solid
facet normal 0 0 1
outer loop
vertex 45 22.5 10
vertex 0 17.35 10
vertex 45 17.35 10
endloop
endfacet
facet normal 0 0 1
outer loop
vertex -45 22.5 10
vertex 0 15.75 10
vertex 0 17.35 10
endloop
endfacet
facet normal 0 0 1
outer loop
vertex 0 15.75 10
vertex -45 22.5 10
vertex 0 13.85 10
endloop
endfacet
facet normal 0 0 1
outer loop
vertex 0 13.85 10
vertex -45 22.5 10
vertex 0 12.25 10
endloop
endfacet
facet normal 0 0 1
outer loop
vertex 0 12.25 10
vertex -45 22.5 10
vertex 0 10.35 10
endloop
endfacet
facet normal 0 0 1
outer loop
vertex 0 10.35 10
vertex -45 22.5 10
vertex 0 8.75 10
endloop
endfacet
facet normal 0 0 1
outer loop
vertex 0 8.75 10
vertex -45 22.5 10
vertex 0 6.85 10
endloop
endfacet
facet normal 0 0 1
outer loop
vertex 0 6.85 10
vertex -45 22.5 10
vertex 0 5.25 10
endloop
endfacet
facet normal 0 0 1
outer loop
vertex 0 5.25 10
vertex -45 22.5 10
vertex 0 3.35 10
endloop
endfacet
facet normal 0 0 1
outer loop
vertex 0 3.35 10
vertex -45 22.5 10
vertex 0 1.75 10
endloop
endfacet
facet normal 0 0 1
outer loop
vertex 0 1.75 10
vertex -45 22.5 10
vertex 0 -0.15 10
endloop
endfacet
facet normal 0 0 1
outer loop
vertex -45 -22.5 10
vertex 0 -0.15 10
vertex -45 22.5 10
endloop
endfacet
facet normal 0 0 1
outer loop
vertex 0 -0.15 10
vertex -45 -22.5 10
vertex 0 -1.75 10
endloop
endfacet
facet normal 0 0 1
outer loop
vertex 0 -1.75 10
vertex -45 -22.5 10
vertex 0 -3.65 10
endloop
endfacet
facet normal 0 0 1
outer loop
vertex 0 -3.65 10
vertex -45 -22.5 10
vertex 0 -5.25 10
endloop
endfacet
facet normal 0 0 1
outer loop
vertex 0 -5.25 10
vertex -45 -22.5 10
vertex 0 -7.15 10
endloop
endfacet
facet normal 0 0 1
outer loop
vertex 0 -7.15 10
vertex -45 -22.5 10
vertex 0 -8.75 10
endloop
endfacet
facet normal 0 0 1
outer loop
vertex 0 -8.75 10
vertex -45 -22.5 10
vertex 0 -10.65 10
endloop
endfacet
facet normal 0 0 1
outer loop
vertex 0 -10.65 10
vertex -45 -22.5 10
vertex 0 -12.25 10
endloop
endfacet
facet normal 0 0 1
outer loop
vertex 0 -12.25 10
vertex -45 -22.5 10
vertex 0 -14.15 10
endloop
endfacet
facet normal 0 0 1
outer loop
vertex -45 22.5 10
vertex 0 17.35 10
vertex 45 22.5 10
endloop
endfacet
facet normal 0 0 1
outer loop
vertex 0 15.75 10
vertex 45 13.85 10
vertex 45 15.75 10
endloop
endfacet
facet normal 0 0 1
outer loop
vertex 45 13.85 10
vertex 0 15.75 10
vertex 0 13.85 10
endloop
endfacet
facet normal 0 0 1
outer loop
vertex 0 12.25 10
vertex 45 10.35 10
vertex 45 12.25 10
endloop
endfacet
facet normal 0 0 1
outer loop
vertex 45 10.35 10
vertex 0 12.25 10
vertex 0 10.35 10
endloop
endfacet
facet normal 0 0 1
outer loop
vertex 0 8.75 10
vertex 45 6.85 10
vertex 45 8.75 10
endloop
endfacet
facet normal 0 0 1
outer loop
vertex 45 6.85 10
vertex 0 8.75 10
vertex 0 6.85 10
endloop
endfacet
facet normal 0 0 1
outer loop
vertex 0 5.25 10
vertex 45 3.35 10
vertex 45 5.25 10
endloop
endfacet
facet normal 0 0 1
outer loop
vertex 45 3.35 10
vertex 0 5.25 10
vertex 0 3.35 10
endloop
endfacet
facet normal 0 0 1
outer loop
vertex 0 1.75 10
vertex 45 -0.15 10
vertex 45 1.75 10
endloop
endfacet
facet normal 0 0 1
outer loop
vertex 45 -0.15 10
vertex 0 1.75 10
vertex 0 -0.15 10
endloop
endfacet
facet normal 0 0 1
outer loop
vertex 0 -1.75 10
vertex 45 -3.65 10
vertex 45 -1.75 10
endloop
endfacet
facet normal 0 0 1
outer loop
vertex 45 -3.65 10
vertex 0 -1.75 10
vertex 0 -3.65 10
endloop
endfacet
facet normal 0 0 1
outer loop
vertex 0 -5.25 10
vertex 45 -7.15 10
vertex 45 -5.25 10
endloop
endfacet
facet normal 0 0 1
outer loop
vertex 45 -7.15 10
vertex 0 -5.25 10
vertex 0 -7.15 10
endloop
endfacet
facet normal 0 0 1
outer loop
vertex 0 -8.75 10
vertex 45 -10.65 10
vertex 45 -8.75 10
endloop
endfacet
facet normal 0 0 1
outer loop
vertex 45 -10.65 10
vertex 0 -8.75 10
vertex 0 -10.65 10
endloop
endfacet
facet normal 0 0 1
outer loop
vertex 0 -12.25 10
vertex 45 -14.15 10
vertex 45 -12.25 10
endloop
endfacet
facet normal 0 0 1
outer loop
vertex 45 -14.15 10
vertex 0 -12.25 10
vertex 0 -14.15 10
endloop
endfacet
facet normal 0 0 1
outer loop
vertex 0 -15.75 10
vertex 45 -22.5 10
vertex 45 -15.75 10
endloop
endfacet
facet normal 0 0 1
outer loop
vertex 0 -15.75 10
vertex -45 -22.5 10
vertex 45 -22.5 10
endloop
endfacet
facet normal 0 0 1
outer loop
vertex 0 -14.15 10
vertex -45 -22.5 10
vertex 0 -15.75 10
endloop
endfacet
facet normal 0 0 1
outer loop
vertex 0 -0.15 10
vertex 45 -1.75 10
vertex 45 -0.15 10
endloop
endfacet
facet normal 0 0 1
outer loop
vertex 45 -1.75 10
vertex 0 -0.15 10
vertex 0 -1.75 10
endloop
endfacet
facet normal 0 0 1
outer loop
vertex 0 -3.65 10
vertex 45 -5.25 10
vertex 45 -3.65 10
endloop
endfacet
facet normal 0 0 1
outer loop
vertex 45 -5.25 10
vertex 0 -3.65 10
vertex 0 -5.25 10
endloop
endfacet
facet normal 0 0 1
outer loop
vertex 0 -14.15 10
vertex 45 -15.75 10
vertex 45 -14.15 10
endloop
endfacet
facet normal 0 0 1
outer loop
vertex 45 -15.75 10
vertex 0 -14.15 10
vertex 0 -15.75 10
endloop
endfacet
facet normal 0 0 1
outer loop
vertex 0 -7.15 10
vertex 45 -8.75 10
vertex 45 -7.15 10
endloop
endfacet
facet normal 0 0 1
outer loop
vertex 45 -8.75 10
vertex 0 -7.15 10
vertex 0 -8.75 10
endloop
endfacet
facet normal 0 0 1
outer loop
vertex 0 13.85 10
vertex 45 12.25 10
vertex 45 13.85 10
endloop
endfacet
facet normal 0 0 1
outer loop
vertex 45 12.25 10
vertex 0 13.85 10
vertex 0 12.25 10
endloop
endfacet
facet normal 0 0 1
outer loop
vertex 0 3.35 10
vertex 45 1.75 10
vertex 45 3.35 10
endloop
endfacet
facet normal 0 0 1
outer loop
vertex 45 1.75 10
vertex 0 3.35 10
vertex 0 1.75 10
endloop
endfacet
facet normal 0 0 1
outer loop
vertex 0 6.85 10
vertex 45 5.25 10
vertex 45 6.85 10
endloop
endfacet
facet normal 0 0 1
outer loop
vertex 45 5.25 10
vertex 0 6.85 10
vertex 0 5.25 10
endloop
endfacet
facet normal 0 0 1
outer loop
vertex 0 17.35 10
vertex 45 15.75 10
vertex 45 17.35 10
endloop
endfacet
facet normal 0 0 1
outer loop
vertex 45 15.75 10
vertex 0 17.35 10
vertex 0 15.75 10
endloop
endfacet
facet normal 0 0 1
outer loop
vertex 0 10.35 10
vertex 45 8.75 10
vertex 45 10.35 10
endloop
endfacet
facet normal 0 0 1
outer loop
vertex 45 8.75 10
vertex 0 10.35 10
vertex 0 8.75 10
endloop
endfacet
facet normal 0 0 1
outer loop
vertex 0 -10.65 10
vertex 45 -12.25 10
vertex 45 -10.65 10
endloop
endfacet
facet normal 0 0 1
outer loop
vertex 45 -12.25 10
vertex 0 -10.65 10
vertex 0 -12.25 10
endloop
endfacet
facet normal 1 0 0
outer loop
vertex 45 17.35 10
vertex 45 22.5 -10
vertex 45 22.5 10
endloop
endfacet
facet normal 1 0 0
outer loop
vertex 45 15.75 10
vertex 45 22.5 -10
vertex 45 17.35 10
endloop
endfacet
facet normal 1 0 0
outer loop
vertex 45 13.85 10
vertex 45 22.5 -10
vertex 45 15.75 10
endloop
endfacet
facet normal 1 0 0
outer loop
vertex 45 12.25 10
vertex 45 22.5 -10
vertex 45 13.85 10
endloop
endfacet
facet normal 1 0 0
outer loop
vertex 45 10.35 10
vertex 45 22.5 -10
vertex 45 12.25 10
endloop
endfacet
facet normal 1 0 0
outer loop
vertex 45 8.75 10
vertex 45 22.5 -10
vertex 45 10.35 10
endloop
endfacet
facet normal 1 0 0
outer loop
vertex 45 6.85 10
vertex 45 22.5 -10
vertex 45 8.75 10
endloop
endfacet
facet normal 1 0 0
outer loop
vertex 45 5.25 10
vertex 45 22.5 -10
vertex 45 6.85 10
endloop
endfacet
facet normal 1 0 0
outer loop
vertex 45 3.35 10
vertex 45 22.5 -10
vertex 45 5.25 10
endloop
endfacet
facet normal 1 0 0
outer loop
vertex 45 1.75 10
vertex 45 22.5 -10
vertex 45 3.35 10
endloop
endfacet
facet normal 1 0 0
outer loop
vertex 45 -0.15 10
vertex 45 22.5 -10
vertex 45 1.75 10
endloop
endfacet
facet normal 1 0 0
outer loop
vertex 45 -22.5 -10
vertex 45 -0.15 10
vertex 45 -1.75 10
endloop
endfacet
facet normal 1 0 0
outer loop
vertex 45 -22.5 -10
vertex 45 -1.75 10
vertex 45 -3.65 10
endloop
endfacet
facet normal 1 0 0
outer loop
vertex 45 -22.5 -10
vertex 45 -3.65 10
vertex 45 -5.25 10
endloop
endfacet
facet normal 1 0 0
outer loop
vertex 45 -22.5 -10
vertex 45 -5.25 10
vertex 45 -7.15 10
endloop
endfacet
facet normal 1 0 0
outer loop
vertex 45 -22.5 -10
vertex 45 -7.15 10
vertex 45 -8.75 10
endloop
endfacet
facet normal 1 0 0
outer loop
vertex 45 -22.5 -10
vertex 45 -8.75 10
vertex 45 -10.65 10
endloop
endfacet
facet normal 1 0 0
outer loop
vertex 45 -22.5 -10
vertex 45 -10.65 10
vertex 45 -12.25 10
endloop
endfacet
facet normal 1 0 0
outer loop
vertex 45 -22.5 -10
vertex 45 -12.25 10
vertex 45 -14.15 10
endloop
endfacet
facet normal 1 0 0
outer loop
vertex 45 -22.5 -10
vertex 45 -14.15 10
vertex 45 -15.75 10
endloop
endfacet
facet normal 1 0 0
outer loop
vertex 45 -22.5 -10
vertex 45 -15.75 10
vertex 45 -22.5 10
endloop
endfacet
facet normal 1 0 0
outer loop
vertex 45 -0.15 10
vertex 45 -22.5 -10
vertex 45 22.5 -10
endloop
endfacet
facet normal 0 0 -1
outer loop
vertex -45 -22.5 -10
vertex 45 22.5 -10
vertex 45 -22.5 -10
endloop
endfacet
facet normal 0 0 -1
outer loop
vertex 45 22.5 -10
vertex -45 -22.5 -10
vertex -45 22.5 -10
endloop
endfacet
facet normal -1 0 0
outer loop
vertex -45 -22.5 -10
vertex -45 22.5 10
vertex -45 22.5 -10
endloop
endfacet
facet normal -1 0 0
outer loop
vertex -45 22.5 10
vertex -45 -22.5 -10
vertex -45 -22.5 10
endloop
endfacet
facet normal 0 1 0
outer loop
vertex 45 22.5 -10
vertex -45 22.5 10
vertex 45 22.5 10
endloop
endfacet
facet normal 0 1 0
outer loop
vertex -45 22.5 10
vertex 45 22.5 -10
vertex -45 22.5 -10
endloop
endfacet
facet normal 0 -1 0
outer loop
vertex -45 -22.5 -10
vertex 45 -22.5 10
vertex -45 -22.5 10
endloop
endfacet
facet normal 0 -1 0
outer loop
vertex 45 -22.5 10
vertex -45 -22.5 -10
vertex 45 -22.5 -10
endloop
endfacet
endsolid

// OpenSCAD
// Drying rack for microscope slides
// Base block: 90 x 45 x 20 mm
// 10 slots: 77 x 1.6 x 10 mm, 3.5 mm spacing, open at top

$fn = 64;

block_x = 90;
block_y = 45;
block_z = 20;

slot_x = 77;
slot_w = 1.6;
slot_z = 10;
slot_z_cut = slot_z + 0.01; // Extend past top face to avoid coplanar faces

slot_spacing = 3.5;
num_slots = 10;

slot_y_start = -(num_slots - 1) / 2 * slot_spacing;

difference() {
    cube([block_x, block_y, block_z], center = true);
    
    for (i = [0 : num_slots - 1]) {
        slot_y = slot_y_start + i * slot_spacing;
        translate([0, slot_y, block_z - slot_z]) {
            cube([slot_x, slot_w, slot_z_cut], center = false);
        }
    }
}
